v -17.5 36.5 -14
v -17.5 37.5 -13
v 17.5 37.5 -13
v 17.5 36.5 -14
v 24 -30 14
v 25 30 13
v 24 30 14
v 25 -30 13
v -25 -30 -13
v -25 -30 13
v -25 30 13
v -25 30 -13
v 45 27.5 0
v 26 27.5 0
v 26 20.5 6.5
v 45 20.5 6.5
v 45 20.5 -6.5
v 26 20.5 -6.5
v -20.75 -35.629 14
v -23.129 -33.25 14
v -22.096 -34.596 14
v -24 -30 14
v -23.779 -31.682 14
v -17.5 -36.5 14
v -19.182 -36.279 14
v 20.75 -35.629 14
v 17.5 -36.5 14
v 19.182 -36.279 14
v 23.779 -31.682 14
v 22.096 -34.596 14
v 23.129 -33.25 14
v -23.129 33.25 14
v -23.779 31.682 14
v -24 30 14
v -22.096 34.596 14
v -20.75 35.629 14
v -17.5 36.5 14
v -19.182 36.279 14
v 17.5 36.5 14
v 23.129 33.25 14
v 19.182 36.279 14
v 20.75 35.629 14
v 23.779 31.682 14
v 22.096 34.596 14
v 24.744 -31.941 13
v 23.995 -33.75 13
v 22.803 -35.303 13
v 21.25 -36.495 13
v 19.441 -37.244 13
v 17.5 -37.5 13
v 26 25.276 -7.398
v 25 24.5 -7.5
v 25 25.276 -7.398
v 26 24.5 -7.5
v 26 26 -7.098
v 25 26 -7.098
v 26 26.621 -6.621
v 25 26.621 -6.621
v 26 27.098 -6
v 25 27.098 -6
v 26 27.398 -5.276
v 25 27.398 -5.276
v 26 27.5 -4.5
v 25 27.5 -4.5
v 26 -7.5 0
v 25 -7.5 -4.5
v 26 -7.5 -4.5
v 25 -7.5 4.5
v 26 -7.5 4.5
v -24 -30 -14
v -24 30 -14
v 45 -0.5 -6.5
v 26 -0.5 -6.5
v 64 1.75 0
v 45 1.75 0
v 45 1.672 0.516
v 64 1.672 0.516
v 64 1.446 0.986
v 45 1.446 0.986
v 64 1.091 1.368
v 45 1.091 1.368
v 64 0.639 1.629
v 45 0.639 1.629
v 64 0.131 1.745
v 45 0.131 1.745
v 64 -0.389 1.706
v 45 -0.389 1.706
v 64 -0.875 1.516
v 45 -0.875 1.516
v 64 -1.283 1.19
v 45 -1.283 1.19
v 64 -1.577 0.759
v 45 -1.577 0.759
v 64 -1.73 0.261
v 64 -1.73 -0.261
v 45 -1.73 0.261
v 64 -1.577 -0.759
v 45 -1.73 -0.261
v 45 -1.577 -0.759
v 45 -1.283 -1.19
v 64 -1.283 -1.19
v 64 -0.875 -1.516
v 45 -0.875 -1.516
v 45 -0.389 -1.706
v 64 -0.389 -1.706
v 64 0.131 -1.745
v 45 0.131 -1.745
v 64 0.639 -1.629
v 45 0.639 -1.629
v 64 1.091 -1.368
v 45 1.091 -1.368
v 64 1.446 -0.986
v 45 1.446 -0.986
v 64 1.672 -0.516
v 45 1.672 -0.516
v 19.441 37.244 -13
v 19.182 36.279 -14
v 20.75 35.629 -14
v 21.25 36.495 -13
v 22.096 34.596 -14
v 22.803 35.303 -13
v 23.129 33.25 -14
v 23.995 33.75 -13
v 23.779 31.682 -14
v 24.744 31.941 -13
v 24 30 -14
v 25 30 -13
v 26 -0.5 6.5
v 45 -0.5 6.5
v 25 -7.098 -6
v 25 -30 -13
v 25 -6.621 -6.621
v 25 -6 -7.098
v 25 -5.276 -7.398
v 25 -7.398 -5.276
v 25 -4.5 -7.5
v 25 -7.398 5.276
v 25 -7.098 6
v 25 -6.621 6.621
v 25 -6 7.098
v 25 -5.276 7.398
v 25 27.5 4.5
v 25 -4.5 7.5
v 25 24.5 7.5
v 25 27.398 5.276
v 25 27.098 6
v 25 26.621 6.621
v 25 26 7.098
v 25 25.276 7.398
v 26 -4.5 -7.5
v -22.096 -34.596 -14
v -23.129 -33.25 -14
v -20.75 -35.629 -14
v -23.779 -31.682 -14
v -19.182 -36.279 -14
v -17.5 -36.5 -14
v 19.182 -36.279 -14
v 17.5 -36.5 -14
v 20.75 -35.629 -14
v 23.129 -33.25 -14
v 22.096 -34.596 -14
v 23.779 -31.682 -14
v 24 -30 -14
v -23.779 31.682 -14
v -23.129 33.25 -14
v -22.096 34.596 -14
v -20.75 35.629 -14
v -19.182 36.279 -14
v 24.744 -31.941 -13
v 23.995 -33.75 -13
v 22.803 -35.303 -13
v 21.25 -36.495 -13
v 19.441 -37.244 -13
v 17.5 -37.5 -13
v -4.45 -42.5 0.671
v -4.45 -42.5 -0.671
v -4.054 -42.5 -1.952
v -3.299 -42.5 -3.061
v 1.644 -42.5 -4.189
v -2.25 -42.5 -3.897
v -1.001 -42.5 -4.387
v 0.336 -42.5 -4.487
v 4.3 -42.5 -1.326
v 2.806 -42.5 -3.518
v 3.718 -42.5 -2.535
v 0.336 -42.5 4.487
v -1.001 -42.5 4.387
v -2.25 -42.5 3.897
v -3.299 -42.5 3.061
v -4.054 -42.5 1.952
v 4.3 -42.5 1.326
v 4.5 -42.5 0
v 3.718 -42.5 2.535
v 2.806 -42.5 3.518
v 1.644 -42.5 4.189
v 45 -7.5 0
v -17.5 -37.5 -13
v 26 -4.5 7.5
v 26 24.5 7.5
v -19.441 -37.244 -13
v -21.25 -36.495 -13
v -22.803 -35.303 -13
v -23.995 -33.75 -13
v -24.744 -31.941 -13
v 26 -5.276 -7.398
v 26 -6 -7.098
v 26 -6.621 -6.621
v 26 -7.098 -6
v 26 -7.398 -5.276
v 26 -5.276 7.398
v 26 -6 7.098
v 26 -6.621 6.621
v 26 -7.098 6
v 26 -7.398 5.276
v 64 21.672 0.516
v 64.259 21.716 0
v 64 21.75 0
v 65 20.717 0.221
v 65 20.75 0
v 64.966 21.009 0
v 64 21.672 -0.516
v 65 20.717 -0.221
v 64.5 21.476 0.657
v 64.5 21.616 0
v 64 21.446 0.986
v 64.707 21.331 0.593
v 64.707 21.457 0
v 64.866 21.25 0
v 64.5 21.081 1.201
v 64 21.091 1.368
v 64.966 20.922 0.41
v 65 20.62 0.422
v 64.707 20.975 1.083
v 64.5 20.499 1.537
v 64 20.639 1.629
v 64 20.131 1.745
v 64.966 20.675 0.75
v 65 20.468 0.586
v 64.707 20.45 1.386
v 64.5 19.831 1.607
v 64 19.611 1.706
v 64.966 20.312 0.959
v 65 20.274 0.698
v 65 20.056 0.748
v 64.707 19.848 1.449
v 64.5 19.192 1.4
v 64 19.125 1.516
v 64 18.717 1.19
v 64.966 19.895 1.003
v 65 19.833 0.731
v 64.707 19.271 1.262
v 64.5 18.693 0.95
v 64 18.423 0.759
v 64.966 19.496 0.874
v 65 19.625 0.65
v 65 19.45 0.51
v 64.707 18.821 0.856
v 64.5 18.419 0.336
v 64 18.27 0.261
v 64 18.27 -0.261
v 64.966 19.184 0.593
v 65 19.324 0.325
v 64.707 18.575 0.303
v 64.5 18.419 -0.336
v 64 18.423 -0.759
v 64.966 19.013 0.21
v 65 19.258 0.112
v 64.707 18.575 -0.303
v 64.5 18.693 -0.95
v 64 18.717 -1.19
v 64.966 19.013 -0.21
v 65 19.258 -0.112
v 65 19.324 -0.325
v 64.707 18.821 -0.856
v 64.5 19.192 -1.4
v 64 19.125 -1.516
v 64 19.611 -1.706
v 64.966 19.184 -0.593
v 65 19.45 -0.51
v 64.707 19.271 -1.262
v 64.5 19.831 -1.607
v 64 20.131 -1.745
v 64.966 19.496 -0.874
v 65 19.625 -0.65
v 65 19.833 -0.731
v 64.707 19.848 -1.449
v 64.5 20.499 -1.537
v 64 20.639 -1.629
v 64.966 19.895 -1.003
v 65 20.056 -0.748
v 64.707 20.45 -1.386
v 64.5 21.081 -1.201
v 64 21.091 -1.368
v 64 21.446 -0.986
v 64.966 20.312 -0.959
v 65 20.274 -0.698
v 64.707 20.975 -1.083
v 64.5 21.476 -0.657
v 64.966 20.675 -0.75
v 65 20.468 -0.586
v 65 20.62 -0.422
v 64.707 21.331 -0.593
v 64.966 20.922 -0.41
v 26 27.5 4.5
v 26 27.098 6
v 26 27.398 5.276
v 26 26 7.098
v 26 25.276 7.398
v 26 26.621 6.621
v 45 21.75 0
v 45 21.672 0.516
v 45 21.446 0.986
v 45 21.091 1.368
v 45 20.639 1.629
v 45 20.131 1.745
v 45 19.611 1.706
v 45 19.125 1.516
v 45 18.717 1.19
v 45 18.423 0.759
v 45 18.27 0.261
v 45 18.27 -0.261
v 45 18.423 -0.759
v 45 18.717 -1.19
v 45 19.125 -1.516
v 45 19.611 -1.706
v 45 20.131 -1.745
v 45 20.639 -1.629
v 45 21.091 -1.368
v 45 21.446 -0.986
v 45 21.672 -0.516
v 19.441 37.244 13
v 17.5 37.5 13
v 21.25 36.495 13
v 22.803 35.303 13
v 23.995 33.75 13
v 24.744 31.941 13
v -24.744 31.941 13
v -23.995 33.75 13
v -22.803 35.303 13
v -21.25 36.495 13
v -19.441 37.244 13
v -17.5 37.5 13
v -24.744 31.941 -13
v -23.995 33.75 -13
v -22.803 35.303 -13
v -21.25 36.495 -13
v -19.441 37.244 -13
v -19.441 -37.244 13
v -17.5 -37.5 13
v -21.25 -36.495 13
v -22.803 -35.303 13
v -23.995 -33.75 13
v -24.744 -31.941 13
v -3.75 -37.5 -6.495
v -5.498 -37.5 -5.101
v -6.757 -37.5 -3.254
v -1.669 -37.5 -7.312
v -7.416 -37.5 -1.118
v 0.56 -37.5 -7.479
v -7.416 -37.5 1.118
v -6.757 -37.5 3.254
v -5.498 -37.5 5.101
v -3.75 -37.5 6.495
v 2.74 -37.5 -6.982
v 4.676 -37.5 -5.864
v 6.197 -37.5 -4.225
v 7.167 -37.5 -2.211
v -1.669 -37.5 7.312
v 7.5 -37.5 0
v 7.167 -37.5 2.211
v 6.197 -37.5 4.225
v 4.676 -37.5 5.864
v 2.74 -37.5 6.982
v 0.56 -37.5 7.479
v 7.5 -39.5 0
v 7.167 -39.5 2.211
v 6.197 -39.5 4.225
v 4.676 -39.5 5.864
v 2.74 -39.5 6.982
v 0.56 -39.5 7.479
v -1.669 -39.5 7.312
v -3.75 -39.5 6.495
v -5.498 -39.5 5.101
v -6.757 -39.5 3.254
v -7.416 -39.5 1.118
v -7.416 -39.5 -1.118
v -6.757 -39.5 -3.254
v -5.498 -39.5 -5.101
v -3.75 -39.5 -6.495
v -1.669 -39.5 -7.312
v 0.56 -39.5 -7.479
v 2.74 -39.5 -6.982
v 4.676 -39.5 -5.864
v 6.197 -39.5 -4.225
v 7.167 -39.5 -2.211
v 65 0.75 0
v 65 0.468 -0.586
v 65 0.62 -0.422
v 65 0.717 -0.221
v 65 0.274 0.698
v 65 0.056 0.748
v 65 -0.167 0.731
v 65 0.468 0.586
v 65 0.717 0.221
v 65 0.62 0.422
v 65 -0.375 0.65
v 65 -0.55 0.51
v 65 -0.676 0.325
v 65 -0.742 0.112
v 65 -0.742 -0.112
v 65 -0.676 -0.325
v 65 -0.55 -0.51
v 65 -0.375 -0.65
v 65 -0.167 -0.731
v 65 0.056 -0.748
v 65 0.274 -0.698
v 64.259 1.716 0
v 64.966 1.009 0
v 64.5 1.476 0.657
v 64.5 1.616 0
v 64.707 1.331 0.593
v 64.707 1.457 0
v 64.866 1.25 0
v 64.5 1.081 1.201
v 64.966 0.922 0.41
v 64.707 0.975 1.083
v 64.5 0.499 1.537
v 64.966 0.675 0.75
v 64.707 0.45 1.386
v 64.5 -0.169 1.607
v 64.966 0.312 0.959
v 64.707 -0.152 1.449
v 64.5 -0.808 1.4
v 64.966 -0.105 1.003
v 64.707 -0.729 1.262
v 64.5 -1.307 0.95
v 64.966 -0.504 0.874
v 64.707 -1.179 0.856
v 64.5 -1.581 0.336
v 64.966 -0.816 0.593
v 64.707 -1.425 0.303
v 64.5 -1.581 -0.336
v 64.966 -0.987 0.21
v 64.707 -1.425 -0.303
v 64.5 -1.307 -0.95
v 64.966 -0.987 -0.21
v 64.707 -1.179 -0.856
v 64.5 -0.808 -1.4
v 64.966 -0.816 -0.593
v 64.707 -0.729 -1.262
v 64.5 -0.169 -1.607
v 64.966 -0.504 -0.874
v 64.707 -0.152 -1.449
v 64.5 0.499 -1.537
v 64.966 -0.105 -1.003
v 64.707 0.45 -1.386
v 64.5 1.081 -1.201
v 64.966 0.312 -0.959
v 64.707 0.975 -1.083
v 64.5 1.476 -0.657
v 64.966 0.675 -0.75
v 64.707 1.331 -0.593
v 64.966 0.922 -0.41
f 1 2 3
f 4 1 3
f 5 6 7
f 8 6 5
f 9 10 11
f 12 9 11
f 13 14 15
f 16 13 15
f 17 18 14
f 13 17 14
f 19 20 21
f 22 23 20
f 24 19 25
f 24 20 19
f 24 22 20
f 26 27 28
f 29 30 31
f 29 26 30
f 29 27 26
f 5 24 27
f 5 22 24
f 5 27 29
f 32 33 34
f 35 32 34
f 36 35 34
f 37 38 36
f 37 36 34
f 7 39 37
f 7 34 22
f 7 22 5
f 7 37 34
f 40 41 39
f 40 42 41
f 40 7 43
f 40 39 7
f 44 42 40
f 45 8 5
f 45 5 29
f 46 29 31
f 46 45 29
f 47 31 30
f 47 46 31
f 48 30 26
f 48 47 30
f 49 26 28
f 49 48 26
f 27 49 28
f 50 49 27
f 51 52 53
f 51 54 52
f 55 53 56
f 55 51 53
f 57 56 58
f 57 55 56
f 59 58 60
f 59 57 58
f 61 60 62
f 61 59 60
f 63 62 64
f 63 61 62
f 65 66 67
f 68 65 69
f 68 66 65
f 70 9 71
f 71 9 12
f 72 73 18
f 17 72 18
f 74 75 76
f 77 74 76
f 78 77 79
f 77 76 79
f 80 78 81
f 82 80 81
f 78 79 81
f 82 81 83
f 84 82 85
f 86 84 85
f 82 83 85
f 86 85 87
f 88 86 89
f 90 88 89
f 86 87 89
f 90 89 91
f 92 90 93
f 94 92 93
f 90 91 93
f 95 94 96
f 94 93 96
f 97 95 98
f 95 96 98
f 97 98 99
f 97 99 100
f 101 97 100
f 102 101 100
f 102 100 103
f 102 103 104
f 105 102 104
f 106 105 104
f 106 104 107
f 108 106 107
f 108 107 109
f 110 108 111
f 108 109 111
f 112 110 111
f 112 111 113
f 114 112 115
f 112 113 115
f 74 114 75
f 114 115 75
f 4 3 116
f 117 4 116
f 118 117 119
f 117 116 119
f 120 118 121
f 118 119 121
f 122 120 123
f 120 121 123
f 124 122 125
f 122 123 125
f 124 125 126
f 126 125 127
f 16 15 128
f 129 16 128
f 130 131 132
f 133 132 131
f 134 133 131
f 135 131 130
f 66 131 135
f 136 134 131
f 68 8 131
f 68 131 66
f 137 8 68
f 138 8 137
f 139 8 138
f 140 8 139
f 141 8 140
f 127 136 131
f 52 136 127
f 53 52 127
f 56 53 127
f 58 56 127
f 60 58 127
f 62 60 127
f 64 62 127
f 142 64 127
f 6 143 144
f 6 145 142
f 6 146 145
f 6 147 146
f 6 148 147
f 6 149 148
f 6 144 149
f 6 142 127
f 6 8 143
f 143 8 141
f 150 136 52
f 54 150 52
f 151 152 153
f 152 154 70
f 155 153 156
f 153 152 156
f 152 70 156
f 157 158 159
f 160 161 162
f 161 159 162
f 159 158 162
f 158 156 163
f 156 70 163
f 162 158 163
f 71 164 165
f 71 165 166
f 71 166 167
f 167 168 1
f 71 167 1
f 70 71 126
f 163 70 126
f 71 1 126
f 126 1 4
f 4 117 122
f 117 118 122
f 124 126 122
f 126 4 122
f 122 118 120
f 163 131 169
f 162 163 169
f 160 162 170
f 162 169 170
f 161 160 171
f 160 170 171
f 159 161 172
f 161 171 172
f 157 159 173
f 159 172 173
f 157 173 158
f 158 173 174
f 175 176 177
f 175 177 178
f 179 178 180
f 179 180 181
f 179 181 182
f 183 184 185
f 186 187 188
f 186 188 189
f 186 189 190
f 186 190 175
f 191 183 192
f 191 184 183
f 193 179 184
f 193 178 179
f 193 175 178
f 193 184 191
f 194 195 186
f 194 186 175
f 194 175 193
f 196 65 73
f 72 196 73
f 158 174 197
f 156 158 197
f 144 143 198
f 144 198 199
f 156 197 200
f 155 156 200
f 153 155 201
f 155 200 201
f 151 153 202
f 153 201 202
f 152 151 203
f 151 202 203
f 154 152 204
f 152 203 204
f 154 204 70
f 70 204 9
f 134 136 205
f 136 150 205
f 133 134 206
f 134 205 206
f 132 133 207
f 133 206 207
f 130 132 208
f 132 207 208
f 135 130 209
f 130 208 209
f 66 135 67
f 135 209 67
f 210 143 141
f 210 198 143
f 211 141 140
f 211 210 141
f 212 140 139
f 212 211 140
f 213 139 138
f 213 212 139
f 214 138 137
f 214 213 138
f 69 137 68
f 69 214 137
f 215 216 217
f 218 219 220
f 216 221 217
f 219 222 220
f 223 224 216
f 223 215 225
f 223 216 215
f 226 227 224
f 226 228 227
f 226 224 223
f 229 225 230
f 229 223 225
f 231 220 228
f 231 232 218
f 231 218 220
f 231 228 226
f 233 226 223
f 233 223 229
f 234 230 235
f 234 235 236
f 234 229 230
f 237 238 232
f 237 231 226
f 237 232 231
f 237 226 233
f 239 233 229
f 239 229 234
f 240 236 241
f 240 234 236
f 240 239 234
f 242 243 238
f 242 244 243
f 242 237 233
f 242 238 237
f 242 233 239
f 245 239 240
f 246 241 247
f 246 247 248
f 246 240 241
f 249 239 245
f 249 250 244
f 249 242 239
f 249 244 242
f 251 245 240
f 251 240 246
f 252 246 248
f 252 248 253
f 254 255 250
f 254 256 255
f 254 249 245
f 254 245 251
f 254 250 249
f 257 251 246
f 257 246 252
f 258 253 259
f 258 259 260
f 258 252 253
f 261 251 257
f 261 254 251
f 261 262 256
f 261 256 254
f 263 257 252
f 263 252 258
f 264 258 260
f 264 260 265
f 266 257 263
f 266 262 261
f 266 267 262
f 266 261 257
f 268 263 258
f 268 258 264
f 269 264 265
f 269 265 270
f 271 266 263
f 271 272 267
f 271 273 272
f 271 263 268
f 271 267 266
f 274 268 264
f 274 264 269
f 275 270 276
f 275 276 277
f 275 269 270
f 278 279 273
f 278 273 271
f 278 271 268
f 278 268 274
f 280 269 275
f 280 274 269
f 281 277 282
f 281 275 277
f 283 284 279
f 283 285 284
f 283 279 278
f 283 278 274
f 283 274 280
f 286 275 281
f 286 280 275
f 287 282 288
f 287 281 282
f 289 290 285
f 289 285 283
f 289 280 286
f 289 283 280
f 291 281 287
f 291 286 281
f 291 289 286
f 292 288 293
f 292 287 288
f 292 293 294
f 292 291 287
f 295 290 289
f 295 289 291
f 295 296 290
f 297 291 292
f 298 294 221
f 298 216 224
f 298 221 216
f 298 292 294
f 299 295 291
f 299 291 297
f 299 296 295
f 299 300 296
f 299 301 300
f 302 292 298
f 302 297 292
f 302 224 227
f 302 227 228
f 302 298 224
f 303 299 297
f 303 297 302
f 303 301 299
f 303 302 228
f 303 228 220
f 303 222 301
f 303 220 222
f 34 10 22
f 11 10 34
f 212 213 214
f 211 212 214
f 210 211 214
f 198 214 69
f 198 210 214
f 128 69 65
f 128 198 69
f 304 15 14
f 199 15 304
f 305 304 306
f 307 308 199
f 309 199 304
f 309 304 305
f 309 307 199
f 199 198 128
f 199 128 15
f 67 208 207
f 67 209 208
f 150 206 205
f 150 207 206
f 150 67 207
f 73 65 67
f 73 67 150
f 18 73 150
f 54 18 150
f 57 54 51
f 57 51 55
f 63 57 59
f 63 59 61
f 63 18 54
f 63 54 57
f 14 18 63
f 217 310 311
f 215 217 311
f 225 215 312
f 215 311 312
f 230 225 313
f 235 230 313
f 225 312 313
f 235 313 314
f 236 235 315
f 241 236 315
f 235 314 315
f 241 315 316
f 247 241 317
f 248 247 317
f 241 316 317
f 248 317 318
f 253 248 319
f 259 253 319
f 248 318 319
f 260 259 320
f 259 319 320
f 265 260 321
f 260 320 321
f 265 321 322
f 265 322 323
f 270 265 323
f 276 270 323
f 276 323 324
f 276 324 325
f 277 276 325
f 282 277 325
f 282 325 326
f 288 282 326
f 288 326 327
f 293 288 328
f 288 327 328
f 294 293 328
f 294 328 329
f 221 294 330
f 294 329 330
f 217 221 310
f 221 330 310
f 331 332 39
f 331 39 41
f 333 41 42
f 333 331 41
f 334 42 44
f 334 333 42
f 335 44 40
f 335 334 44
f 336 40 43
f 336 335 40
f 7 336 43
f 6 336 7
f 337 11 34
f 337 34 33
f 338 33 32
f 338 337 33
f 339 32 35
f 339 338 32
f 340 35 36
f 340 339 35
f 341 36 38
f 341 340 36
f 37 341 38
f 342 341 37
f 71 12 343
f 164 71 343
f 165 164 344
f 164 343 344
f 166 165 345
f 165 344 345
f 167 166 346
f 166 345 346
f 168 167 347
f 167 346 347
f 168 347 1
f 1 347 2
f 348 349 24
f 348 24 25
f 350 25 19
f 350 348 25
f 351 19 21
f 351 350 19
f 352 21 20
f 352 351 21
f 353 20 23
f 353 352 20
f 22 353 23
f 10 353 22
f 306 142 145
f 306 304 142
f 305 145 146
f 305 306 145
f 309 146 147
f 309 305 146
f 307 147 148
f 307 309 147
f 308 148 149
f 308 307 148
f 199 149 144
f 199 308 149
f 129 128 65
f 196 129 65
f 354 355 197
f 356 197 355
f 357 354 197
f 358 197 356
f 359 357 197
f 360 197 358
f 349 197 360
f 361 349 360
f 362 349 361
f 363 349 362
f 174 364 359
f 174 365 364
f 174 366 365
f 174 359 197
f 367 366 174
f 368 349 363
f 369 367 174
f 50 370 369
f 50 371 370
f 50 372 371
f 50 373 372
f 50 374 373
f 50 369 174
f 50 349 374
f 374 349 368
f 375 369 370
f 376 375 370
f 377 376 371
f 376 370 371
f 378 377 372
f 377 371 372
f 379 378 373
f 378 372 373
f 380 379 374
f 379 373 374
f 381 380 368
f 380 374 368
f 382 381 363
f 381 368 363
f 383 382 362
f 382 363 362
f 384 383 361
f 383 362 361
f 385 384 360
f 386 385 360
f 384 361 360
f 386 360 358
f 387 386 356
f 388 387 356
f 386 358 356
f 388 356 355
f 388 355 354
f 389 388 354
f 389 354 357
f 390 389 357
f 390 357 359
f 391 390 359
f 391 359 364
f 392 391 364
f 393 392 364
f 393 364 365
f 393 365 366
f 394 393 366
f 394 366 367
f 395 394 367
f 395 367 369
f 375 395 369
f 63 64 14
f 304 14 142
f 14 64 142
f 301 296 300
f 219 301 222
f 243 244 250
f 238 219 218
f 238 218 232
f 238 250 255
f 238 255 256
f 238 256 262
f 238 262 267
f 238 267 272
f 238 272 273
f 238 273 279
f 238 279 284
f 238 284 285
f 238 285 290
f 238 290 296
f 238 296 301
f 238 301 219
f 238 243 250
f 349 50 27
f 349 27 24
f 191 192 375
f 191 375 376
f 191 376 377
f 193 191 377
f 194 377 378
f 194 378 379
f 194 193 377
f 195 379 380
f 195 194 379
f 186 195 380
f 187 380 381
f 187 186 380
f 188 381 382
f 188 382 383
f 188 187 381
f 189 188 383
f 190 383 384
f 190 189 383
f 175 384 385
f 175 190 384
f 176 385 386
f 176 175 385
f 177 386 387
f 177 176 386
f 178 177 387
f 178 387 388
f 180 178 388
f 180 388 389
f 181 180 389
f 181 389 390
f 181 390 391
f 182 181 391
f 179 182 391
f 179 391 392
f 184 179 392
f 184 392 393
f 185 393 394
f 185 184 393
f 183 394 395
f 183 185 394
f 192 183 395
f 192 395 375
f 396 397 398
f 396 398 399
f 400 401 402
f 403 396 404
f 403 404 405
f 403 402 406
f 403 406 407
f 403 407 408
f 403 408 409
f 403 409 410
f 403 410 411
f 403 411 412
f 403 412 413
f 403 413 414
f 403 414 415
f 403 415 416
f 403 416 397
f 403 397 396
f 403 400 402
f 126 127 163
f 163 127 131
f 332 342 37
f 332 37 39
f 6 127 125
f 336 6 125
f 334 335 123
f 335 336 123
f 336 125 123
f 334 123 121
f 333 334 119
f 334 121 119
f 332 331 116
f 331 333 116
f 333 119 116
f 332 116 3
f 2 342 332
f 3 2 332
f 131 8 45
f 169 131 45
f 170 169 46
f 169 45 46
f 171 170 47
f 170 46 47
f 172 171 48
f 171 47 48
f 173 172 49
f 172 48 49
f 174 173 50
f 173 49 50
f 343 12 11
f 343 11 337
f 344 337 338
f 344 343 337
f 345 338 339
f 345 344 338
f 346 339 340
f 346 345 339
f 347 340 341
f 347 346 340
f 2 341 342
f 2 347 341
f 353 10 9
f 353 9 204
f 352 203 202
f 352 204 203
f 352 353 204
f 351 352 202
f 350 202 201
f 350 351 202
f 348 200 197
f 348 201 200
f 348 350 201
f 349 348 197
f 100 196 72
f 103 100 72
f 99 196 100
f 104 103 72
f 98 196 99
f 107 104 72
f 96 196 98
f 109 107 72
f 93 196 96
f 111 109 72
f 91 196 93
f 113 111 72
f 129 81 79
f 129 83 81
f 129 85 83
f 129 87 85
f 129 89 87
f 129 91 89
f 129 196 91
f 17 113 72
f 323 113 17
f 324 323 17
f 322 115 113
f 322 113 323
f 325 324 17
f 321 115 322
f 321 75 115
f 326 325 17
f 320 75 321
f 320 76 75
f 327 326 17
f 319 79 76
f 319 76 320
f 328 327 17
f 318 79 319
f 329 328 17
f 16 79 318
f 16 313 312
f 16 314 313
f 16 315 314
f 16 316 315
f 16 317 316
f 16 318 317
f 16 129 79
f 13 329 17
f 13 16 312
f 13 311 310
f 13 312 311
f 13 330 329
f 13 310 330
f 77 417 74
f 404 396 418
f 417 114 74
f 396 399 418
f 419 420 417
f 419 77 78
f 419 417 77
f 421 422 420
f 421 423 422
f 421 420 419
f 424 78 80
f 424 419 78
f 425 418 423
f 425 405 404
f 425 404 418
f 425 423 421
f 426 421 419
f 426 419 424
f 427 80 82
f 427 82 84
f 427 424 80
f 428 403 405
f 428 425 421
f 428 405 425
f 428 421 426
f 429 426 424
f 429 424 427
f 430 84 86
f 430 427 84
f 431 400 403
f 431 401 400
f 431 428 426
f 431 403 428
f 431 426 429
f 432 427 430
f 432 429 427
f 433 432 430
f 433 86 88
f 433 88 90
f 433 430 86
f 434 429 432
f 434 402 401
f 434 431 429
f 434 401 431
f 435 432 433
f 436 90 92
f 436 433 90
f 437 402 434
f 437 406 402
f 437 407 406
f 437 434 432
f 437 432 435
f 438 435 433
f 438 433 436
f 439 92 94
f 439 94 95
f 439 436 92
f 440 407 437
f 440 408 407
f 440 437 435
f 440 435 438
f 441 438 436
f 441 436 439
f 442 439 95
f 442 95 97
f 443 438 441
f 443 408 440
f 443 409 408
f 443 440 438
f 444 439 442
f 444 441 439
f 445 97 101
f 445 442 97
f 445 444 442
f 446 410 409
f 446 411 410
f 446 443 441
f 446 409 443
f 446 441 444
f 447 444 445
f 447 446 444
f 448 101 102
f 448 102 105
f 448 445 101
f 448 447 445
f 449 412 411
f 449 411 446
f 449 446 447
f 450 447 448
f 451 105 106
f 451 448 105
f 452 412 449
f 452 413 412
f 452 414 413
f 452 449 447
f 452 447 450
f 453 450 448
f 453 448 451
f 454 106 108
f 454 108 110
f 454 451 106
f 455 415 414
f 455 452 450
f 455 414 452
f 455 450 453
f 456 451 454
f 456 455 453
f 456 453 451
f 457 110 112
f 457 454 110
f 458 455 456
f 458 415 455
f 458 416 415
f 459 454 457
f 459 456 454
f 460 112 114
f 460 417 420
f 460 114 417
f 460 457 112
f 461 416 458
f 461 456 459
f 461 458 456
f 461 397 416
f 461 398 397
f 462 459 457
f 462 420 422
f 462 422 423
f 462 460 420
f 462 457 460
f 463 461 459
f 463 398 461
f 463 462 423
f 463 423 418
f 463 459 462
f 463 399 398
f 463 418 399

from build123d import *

# Parameters (mm, degrees)
SKETCH_W        = 50
SKETCH_H        = 75
PAD_DEPTH       = 14
FILLET_R        = 7.5
CHAMFER_SIZE    = 1
SKETCH001_W     = 35
SKETCH001_H     = 15
PAD001_DEPTH    = 1
FILLET001_R     = 3
PAD002_DEPTH    = 19
SKETCH003_R     = 1.75
PAD003_DEPTH    = 20
FILLET002_R     = 1
SKETCH004_R     = 7.5
PAD004_DEPTH    = 1.5
SKETCH005_R     = 7.5
PAD005_DEPTH    = 3.5
CHAMFER001_SIZE = 3


with BuildPart() as part:
    # Sketch → Pad (new body, symmetric)
    with BuildSketch(Plane.XY):
        Rectangle(SKETCH_W, SKETCH_H)
    extrude(amount=PAD_DEPTH, both=True)

    # Fillet
    fillet_edges = [part.edges().sort_by_distance(p)[0] for p in [
        (25, -37.5, 0),
        (-25, -37.5, 0),
        (25, 37.5, 0),
        (-25, 37.5, 0),
    ]]
    fillet(fillet_edges, radius=FILLET_R)

    # Chamfer
    chamfer_edges = [part.edges().sort_by_distance(p)[0] for p in [
        (0, 37.5, 14),
        (-22.803301, 35.303301, 14),
        (-25, 0, 14),
        (25, 0, 14),
        (22.803301, 35.303301, 14),
        (-22.803301, -35.303301, 14),
        (0, -37.5, 14),
        (22.803301, -35.303301, 14),
        (22.803301, -35.303301, -14),
        (0, -37.5, -14),
        (-22.803301, -35.303301, -14),
        (-25, 0, -14),
        (25, 0, -14),
        (22.803301, 35.303301, -14),
        (0, 37.5, -14),
        (-22.803301, 35.303301, -14),
    ]]
    chamfer(chamfer_edges, length=CHAMFER_SIZE)

    # Sketch001 (on Face13 of Chamfer) → Pad001 (join)
    with BuildSketch(Plane.YZ.offset(25)):
        with Locations((10, 0)):
            Rectangle(SKETCH001_W, SKETCH001_H)
    extrude(amount=PAD001_DEPTH)

    # Fillet001
    fillet001_edges = [part.edges().sort_by_distance(p)[0] for p in [
        (25.5, 27.5, 7.5),
        (25.5, 27.5, -7.5),
        (25.5, -7.5, -7.5),
        (25.5, -7.5, 7.5),
    ]]
    fillet(fillet001_edges, radius=FILLET001_R)

    # Sketch002 (on Face14 of Fillet001) → Pad002 (join)
    with BuildSketch(Plane.YZ.offset(26)):
        Polygon((27.5, 0), (20.5, 6.5), (-0.5, 6.5), (-7.5, 0), (-0.5, -6.5), (20.5, -6.5), align=None)
    extrude(amount=PAD002_DEPTH)

    # Sketch003 (on Face42 of Pad002) → Pad003 (join)
    with BuildSketch(Plane.YZ.offset(45)):
        Circle(SKETCH003_R)
        with Locations((20, 0)):
            Circle(SKETCH003_R)
    extrude(amount=PAD003_DEPTH)

    # Fillet002
    fillet002_edges = [part.edges().sort_by_distance(p)[0] for p in [
        (65, -1.75, 0),
        (65, 18.25, 0),
    ]]
    fillet(fillet002_edges, radius=FILLET002_R)

    # Sketch004 (on Face36 of Fillet002) → Pad004 (join)
    with BuildSketch(Plane.XZ.offset(37.5)):
        Circle(SKETCH004_R)
    extrude(amount=PAD004_DEPTH)

    # Sketch005 (on Face51 of Pad004) → Pad005 (join)
    with BuildSketch(Plane.XZ.offset(39)):
        Circle(SKETCH005_R)
    extrude(amount=PAD005_DEPTH)

    # Chamfer001
    chamfer001_edges = [part.edges().sort_by_distance(p)[0] for p in [
        (-7.5, -42.5, 0),
    ]]
    chamfer(chamfer001_edges, length=CHAMFER001_SIZE)


solid = part.part
